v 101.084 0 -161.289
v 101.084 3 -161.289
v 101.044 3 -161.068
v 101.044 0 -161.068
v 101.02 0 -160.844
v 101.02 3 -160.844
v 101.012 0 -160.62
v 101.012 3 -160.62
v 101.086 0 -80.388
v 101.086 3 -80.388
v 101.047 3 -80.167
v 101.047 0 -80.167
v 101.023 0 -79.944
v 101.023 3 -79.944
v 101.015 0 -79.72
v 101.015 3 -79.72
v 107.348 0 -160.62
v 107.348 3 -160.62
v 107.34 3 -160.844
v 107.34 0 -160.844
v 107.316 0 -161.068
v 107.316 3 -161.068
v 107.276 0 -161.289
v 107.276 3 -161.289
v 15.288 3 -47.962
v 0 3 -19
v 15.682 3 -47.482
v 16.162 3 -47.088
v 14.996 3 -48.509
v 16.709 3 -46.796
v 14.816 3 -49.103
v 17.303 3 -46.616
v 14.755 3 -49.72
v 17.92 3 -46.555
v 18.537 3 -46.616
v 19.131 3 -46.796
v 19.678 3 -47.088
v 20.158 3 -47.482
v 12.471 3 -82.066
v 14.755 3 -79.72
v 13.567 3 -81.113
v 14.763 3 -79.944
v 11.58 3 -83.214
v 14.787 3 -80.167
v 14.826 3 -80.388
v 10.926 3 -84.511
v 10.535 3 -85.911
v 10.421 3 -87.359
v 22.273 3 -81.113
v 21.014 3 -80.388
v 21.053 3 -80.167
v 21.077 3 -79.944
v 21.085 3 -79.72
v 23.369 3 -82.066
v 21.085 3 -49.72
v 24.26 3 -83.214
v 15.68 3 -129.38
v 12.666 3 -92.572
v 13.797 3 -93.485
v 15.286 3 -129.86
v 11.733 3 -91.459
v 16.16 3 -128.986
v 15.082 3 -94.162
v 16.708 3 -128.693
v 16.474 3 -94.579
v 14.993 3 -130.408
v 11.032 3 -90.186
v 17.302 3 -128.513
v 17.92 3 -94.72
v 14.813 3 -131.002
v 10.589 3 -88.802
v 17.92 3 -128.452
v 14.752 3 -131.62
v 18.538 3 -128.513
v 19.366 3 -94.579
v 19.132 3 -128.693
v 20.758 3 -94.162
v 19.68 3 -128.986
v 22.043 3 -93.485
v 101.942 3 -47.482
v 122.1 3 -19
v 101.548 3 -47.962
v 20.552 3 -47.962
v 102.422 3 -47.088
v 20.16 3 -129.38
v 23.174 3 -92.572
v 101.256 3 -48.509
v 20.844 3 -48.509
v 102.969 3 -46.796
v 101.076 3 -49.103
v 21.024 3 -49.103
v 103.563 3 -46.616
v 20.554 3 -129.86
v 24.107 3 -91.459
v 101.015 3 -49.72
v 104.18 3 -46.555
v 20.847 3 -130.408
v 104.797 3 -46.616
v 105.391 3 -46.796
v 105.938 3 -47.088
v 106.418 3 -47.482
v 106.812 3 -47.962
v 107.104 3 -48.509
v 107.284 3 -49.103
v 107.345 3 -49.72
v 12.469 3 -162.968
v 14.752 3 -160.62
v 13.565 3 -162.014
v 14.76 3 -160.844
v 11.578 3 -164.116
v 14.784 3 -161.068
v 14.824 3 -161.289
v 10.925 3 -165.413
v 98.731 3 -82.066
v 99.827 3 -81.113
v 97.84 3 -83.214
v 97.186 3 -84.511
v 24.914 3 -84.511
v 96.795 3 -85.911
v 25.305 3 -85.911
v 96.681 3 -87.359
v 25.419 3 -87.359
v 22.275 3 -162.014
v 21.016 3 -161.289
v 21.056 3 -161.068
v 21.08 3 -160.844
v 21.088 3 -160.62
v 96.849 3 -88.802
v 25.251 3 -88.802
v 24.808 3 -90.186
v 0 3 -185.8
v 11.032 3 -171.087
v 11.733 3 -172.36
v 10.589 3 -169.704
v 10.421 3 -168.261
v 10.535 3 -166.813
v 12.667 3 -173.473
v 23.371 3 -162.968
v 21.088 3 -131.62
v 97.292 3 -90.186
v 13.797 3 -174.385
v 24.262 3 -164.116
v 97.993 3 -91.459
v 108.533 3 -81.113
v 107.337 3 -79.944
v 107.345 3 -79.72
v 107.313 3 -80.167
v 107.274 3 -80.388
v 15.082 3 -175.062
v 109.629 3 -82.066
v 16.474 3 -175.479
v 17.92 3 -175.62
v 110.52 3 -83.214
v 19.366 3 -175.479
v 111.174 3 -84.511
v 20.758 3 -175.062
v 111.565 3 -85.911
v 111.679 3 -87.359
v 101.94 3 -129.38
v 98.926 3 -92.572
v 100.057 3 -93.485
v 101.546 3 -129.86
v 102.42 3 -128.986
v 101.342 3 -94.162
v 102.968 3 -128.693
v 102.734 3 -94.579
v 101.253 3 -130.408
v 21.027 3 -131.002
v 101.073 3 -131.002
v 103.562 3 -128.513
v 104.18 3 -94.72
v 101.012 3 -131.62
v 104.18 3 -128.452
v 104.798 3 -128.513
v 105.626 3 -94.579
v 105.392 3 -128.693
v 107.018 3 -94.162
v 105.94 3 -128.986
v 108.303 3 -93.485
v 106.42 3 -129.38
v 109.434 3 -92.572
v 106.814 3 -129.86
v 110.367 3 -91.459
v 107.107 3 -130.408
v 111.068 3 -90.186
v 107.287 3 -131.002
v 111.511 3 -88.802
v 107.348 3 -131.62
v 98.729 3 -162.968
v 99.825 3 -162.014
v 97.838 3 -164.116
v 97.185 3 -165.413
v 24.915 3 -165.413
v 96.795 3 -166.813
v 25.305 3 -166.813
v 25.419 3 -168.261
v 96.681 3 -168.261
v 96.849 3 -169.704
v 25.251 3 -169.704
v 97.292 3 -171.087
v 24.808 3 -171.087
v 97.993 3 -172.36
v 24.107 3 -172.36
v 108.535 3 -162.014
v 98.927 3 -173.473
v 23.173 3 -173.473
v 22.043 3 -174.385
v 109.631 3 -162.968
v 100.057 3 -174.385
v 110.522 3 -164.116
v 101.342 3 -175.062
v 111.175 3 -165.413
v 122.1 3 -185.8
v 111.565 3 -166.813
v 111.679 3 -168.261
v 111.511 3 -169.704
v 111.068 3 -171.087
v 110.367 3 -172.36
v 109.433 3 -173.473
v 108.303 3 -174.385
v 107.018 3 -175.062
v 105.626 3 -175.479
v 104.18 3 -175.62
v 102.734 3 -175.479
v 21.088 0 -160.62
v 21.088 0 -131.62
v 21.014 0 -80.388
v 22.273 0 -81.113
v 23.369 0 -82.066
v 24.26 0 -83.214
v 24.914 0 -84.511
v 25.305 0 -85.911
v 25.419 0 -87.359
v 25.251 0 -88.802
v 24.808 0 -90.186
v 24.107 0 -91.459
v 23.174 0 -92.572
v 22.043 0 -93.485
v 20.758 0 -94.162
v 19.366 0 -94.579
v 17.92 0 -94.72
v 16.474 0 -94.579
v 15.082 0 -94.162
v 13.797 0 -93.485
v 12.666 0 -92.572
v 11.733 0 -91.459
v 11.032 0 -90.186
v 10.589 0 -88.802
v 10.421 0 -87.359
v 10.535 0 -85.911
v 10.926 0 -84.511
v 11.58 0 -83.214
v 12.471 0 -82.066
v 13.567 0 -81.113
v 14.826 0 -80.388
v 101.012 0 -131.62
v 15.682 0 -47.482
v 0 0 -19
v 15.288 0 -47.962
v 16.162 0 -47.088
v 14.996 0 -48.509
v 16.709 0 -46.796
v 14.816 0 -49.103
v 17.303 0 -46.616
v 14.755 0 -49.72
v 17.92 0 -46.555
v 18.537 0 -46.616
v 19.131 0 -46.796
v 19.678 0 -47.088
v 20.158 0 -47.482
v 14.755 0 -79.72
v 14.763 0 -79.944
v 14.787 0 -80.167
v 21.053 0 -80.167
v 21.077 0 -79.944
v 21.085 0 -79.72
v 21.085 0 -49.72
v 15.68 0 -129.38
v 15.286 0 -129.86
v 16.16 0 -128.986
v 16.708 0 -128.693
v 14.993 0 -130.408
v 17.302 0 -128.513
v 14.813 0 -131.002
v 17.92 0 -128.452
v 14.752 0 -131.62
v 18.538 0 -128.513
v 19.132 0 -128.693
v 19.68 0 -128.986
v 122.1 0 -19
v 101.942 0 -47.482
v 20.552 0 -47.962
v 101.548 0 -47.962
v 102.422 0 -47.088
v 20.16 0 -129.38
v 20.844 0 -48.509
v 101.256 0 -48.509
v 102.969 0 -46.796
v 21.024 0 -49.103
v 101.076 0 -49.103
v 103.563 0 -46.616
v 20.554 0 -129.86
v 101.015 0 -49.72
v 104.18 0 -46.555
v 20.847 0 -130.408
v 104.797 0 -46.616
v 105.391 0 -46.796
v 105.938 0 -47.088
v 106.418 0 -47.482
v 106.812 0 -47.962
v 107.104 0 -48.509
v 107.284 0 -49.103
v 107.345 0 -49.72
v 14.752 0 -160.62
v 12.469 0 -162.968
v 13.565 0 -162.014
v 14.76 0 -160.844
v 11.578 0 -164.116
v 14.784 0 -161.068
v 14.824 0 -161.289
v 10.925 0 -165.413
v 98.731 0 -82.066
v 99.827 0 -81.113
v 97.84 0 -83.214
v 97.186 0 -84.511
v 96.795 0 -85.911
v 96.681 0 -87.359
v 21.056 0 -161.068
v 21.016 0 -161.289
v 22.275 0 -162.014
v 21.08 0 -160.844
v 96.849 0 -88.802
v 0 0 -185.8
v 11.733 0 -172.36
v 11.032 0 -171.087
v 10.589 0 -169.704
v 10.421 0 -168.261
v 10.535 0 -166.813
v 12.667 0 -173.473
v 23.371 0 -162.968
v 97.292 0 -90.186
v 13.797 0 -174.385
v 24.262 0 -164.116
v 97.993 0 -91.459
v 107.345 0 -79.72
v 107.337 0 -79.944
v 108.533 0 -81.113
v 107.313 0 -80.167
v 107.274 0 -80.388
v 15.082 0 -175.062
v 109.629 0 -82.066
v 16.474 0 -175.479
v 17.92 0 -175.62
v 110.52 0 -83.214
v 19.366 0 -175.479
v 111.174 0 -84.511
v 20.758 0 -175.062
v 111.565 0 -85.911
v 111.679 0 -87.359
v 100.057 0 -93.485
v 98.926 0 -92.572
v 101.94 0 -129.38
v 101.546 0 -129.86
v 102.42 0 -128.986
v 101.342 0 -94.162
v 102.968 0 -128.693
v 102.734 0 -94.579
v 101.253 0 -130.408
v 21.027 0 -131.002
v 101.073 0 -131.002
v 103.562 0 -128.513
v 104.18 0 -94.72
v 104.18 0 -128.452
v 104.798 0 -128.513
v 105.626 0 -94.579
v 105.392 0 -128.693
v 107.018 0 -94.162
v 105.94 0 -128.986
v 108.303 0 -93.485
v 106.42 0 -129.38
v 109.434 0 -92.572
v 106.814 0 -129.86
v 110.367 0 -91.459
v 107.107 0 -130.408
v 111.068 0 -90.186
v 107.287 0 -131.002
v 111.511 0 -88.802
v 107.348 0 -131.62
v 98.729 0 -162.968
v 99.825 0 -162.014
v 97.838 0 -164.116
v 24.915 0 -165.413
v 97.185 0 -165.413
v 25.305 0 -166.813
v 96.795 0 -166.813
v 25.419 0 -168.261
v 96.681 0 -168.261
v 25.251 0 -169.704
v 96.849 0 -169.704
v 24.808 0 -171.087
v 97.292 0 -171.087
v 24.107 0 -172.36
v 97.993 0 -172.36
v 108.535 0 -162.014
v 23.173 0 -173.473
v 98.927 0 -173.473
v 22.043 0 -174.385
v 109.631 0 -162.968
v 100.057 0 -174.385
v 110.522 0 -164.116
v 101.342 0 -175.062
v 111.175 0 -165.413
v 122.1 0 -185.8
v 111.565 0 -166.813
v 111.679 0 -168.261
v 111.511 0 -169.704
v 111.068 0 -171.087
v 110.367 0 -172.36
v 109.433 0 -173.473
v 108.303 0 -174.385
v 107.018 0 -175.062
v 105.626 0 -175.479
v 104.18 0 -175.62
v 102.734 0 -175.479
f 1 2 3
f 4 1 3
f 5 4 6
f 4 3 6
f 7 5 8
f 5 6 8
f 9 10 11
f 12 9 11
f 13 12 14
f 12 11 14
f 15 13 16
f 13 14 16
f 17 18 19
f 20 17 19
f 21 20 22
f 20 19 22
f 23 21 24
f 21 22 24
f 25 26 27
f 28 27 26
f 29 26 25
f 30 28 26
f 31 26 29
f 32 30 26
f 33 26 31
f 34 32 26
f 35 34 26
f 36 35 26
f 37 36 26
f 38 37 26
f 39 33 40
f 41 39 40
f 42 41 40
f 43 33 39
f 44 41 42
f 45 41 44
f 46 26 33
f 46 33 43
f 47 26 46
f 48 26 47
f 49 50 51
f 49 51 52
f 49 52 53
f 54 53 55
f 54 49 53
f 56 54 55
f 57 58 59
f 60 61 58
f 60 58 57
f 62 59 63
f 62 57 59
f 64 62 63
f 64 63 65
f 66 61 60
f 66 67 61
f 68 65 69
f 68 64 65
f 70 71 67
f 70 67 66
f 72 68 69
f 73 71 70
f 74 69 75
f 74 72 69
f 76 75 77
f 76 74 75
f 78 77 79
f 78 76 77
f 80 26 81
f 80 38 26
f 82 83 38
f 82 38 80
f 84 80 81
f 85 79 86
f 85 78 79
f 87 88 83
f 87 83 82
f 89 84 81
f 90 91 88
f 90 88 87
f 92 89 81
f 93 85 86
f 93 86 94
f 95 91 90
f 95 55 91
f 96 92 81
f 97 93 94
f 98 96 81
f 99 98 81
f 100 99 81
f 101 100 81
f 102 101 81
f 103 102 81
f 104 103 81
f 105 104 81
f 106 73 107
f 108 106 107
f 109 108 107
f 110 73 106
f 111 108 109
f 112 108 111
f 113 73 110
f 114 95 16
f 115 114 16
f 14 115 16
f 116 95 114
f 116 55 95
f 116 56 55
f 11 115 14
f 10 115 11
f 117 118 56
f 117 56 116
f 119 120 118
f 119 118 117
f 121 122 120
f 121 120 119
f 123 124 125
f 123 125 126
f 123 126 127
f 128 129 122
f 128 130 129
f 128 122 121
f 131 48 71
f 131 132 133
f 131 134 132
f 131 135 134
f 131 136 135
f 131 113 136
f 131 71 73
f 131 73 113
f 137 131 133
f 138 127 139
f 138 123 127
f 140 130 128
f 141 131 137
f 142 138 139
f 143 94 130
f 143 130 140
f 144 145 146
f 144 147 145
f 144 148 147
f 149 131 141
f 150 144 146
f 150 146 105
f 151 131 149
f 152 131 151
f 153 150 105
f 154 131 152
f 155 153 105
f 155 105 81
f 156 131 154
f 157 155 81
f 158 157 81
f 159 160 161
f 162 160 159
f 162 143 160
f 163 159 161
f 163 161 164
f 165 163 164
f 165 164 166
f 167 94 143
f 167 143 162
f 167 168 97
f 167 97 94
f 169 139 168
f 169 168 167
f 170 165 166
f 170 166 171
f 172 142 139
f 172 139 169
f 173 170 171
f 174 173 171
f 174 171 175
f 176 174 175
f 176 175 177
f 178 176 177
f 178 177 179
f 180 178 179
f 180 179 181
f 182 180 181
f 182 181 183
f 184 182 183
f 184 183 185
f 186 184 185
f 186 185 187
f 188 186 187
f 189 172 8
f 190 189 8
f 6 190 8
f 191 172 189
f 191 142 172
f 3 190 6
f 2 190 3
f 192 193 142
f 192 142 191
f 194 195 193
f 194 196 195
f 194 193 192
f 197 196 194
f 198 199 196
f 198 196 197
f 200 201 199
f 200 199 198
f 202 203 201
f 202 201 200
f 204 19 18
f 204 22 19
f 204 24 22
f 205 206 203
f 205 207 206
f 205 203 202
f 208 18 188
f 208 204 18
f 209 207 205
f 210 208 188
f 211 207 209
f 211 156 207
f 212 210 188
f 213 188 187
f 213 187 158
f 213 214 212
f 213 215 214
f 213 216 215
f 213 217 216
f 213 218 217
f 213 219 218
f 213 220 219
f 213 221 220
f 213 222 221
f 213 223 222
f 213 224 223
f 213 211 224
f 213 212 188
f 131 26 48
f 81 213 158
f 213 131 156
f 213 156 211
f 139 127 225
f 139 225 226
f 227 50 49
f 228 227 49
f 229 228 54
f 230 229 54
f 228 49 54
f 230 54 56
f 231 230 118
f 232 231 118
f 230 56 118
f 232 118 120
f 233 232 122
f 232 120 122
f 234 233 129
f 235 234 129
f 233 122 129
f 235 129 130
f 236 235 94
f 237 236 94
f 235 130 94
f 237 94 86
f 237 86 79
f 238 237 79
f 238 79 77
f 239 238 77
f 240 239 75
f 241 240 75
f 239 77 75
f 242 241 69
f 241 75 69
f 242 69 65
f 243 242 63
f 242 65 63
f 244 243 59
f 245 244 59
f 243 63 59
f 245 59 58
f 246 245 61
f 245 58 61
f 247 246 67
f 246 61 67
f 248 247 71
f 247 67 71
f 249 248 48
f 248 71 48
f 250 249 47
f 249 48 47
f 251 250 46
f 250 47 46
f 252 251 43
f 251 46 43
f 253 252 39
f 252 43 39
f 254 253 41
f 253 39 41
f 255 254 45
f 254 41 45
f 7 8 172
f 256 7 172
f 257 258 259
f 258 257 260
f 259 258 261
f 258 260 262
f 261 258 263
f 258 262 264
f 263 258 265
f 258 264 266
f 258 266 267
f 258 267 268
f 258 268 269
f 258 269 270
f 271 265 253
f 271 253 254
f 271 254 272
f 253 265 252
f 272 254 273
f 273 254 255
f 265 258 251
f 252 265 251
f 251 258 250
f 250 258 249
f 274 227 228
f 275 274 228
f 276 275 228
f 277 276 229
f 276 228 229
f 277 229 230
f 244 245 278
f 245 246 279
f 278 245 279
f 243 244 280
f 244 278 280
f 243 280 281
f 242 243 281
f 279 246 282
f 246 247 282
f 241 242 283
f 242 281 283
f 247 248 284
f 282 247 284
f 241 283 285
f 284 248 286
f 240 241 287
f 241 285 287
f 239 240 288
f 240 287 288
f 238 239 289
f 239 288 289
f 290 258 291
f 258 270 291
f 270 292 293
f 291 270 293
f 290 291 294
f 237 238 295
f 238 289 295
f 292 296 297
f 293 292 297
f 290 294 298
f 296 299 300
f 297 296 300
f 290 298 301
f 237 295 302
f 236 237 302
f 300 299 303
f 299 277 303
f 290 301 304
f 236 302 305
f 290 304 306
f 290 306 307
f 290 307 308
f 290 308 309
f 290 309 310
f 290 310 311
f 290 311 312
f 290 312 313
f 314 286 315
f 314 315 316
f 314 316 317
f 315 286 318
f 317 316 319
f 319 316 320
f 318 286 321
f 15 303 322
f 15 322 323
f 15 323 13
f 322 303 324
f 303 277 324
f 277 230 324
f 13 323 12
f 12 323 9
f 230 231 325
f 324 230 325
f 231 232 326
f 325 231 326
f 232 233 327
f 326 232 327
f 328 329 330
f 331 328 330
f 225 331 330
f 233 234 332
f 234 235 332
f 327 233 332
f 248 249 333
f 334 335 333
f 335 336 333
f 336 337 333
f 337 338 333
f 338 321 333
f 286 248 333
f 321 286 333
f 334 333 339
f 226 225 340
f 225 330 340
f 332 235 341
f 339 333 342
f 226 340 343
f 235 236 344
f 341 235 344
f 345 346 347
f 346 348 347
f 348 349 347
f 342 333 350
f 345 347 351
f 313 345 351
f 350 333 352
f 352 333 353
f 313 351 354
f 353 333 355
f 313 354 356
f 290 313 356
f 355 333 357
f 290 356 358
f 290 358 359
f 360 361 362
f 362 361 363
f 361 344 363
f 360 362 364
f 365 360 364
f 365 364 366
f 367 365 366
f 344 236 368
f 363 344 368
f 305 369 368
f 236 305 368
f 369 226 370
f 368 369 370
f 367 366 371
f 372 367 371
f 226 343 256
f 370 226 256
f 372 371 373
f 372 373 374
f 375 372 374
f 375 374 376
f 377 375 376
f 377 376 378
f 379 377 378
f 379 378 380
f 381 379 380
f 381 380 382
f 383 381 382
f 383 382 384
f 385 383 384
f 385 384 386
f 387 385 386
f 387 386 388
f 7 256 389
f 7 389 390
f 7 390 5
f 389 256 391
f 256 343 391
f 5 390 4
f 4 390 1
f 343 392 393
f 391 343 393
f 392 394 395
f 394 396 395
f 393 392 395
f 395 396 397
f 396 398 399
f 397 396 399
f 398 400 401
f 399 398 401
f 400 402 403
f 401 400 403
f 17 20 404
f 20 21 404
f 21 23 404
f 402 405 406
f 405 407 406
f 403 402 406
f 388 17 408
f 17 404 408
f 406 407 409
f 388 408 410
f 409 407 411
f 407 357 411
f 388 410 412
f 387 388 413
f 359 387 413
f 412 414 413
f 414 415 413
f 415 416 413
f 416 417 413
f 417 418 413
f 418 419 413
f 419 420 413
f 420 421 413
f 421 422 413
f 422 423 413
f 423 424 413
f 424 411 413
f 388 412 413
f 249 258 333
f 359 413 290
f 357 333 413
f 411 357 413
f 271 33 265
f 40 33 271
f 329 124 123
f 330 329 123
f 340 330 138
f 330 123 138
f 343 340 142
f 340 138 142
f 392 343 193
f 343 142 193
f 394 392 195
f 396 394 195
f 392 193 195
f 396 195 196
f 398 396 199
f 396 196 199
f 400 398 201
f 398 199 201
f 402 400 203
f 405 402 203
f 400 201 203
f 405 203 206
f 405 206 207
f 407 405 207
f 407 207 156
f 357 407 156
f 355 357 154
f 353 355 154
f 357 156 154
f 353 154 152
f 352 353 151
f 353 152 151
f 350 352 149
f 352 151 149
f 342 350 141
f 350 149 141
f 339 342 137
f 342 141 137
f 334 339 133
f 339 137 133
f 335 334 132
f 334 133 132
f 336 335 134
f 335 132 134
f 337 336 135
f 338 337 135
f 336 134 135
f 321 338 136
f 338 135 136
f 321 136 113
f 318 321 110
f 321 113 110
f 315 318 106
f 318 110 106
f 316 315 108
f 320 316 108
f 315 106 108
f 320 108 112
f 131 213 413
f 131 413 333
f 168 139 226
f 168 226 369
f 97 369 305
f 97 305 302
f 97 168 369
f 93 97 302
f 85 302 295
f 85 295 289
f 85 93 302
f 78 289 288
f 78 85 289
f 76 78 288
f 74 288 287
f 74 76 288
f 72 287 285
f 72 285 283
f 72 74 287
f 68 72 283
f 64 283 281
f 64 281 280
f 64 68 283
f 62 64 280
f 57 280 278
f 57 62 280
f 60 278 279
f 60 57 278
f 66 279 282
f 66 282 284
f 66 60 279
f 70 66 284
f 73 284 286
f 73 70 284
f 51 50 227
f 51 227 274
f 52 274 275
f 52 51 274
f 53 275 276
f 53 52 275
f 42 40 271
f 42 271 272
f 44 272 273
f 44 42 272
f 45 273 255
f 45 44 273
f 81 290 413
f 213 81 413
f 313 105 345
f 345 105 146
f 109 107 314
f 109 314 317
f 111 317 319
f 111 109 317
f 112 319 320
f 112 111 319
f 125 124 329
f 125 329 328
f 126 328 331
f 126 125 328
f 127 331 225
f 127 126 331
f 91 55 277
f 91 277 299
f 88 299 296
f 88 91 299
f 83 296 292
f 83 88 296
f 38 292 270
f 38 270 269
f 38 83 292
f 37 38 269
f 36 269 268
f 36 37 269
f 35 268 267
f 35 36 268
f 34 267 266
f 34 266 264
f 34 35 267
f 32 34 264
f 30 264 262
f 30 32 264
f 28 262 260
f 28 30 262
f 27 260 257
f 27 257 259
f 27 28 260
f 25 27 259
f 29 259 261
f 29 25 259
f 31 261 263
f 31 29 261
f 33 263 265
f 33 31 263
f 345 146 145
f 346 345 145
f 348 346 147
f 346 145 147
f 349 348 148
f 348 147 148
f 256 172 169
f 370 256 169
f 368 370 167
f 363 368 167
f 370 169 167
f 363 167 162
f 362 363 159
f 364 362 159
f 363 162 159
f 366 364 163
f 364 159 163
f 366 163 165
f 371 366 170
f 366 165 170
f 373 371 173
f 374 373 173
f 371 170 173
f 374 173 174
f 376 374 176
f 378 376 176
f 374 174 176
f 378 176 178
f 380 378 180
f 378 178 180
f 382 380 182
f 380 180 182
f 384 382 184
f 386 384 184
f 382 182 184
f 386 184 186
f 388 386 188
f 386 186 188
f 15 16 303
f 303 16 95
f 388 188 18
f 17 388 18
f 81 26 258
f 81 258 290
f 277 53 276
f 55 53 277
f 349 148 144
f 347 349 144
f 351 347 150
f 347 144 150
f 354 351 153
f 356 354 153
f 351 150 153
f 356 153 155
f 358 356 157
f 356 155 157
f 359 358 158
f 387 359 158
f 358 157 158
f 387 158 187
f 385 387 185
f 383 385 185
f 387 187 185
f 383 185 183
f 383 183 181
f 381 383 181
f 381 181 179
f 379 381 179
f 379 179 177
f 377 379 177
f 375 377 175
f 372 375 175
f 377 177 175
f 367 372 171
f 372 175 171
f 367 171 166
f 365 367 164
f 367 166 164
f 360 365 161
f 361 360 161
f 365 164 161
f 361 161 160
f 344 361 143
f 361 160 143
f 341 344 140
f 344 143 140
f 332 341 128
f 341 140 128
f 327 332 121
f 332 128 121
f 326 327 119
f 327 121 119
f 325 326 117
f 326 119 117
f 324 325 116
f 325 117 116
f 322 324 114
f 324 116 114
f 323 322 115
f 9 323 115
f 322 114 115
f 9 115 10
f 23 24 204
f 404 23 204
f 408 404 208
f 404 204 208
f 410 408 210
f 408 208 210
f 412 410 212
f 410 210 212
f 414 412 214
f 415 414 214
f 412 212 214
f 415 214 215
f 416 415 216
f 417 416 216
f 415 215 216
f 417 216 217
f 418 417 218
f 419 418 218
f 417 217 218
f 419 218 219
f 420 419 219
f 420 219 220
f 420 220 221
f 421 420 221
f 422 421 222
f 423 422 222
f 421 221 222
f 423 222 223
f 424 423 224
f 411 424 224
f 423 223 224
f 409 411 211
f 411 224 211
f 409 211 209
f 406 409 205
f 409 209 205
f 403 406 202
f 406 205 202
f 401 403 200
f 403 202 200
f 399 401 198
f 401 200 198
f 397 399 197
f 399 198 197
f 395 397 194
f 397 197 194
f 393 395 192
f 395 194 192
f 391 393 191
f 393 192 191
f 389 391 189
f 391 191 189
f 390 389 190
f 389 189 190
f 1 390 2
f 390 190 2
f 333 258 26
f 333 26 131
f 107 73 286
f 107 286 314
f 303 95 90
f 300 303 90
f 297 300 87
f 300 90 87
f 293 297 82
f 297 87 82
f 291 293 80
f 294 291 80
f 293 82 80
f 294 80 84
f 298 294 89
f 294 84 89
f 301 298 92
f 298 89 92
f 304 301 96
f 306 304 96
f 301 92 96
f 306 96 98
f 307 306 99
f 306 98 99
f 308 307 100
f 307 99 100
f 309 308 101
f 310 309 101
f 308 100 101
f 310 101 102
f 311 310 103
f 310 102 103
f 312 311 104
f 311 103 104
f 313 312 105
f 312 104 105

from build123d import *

# Parameters (mm, degrees)
SKETCH3_W           = 122.1
SKETCH3_H           = 197.8
BOSS_EXTRUDE2_DEPTH = 3
SKETCH4_R           = 7.5
CUT_EXTRUDE2_DEPTH  = 3
SKETCH5_W           = 185.639017853
SKETCH5_H           = 93.814581834
CUT_EXTRUDE3_DEPTH  = 12
SKETCH7_W           = 181.97184254
SKETCH7_H           = 161.609726855
CUT_EXTRUDE4_DEPTH  = 19


with BuildPart() as part:
    # Sketch3 → Boss-Extrude2 (new body)
    with BuildSketch(Plane(origin=(0, 0, 0), x_dir=(1, 0, 0), z_dir=(0, 1, 0))):
        with Locations((61.05, 98.9)):
            Rectangle(SKETCH3_W, SKETCH3_H)
    extrude(amount=BOSS_EXTRUDE2_DEPTH)

    # Sketch4 → Cut-Extrude2 (cut)
    with BuildSketch(Plane(origin=(0, 3, 0), x_dir=(1, 0, 0), z_dir=(0, 1, 0))):
        with Locations((17.92, 168.12)):
            Circle(SKETCH4_R)
        with Locations((17.92, 87.22)):
            Circle(SKETCH4_R)
        with Locations((104.18, 87.22)):
            Circle(SKETCH4_R)
        with Locations((104.18, 168.12)):
            Circle(SKETCH4_R)
        with BuildLine():
            Line((21.08772899, 160.62), (21.08772899, 131.62))
            ThreePointArc((21.08772899, 131.62), (17.92, 128.45227101), (14.75227101, 131.62))
            Line((14.75227101, 131.62), (14.75227101, 160.62))
            ThreePointArc((14.75227101, 160.62), (17.92, 163.78772899), (21.08772899, 160.62))
        make_face()
        with BuildLine():
            Line((21.085, 79.72), (21.085, 49.72))
            ThreePointArc((21.085, 49.72), (17.92, 46.555), (14.755, 49.72))
            Line((14.755, 49.72), (14.755, 79.72))
            ThreePointArc((14.755, 79.72), (17.92, 82.885), (21.085, 79.72))
        make_face()
        with BuildLine():
            Line((101.015, 79.72), (101.015, 49.72))
            ThreePointArc((101.015, 49.72), (104.18, 46.555), (107.345, 49.72))
            Line((107.345, 49.72), (107.345, 79.72))
            ThreePointArc((107.345, 79.72), (104.18, 82.885), (101.015, 79.72))
        make_face()
        with BuildLine():
            Line((101.01227101, 160.62), (101.01227101, 131.62))
            ThreePointArc((101.01227101, 131.62), (104.18, 128.45227101), (107.34772899, 131.62))
            Line((107.34772899, 131.62), (107.34772899, 160.62))
            ThreePointArc((107.34772899, 160.62), (104.18, 163.78772899), (101.01227101, 160.62))
        make_face()
    extrude(amount=-CUT_EXTRUDE2_DEPTH, mode=Mode.SUBTRACT)

    # Sketch5 → Cut-Extrude3 (cut)
    with BuildSketch(Plane(origin=(0, 0, -197.8), x_dir=(-1, 0, 0), z_dir=(0, 0, -1))):
        with Locations((-62.393879106, -6.143731482)):
            Rectangle(SKETCH5_W, SKETCH5_H)
    extrude(amount=-CUT_EXTRUDE3_DEPTH, mode=Mode.SUBTRACT)

    # Sketch7 → Cut-Extrude4 (cut)
    with BuildSketch(Plane.XY):
        with Locations((66.543858185, 9.384028943)):
            Rectangle(SKETCH7_W, SKETCH7_H)
    extrude(amount=-CUT_EXTRUDE4_DEPTH, mode=Mode.SUBTRACT)


solid = part.part
